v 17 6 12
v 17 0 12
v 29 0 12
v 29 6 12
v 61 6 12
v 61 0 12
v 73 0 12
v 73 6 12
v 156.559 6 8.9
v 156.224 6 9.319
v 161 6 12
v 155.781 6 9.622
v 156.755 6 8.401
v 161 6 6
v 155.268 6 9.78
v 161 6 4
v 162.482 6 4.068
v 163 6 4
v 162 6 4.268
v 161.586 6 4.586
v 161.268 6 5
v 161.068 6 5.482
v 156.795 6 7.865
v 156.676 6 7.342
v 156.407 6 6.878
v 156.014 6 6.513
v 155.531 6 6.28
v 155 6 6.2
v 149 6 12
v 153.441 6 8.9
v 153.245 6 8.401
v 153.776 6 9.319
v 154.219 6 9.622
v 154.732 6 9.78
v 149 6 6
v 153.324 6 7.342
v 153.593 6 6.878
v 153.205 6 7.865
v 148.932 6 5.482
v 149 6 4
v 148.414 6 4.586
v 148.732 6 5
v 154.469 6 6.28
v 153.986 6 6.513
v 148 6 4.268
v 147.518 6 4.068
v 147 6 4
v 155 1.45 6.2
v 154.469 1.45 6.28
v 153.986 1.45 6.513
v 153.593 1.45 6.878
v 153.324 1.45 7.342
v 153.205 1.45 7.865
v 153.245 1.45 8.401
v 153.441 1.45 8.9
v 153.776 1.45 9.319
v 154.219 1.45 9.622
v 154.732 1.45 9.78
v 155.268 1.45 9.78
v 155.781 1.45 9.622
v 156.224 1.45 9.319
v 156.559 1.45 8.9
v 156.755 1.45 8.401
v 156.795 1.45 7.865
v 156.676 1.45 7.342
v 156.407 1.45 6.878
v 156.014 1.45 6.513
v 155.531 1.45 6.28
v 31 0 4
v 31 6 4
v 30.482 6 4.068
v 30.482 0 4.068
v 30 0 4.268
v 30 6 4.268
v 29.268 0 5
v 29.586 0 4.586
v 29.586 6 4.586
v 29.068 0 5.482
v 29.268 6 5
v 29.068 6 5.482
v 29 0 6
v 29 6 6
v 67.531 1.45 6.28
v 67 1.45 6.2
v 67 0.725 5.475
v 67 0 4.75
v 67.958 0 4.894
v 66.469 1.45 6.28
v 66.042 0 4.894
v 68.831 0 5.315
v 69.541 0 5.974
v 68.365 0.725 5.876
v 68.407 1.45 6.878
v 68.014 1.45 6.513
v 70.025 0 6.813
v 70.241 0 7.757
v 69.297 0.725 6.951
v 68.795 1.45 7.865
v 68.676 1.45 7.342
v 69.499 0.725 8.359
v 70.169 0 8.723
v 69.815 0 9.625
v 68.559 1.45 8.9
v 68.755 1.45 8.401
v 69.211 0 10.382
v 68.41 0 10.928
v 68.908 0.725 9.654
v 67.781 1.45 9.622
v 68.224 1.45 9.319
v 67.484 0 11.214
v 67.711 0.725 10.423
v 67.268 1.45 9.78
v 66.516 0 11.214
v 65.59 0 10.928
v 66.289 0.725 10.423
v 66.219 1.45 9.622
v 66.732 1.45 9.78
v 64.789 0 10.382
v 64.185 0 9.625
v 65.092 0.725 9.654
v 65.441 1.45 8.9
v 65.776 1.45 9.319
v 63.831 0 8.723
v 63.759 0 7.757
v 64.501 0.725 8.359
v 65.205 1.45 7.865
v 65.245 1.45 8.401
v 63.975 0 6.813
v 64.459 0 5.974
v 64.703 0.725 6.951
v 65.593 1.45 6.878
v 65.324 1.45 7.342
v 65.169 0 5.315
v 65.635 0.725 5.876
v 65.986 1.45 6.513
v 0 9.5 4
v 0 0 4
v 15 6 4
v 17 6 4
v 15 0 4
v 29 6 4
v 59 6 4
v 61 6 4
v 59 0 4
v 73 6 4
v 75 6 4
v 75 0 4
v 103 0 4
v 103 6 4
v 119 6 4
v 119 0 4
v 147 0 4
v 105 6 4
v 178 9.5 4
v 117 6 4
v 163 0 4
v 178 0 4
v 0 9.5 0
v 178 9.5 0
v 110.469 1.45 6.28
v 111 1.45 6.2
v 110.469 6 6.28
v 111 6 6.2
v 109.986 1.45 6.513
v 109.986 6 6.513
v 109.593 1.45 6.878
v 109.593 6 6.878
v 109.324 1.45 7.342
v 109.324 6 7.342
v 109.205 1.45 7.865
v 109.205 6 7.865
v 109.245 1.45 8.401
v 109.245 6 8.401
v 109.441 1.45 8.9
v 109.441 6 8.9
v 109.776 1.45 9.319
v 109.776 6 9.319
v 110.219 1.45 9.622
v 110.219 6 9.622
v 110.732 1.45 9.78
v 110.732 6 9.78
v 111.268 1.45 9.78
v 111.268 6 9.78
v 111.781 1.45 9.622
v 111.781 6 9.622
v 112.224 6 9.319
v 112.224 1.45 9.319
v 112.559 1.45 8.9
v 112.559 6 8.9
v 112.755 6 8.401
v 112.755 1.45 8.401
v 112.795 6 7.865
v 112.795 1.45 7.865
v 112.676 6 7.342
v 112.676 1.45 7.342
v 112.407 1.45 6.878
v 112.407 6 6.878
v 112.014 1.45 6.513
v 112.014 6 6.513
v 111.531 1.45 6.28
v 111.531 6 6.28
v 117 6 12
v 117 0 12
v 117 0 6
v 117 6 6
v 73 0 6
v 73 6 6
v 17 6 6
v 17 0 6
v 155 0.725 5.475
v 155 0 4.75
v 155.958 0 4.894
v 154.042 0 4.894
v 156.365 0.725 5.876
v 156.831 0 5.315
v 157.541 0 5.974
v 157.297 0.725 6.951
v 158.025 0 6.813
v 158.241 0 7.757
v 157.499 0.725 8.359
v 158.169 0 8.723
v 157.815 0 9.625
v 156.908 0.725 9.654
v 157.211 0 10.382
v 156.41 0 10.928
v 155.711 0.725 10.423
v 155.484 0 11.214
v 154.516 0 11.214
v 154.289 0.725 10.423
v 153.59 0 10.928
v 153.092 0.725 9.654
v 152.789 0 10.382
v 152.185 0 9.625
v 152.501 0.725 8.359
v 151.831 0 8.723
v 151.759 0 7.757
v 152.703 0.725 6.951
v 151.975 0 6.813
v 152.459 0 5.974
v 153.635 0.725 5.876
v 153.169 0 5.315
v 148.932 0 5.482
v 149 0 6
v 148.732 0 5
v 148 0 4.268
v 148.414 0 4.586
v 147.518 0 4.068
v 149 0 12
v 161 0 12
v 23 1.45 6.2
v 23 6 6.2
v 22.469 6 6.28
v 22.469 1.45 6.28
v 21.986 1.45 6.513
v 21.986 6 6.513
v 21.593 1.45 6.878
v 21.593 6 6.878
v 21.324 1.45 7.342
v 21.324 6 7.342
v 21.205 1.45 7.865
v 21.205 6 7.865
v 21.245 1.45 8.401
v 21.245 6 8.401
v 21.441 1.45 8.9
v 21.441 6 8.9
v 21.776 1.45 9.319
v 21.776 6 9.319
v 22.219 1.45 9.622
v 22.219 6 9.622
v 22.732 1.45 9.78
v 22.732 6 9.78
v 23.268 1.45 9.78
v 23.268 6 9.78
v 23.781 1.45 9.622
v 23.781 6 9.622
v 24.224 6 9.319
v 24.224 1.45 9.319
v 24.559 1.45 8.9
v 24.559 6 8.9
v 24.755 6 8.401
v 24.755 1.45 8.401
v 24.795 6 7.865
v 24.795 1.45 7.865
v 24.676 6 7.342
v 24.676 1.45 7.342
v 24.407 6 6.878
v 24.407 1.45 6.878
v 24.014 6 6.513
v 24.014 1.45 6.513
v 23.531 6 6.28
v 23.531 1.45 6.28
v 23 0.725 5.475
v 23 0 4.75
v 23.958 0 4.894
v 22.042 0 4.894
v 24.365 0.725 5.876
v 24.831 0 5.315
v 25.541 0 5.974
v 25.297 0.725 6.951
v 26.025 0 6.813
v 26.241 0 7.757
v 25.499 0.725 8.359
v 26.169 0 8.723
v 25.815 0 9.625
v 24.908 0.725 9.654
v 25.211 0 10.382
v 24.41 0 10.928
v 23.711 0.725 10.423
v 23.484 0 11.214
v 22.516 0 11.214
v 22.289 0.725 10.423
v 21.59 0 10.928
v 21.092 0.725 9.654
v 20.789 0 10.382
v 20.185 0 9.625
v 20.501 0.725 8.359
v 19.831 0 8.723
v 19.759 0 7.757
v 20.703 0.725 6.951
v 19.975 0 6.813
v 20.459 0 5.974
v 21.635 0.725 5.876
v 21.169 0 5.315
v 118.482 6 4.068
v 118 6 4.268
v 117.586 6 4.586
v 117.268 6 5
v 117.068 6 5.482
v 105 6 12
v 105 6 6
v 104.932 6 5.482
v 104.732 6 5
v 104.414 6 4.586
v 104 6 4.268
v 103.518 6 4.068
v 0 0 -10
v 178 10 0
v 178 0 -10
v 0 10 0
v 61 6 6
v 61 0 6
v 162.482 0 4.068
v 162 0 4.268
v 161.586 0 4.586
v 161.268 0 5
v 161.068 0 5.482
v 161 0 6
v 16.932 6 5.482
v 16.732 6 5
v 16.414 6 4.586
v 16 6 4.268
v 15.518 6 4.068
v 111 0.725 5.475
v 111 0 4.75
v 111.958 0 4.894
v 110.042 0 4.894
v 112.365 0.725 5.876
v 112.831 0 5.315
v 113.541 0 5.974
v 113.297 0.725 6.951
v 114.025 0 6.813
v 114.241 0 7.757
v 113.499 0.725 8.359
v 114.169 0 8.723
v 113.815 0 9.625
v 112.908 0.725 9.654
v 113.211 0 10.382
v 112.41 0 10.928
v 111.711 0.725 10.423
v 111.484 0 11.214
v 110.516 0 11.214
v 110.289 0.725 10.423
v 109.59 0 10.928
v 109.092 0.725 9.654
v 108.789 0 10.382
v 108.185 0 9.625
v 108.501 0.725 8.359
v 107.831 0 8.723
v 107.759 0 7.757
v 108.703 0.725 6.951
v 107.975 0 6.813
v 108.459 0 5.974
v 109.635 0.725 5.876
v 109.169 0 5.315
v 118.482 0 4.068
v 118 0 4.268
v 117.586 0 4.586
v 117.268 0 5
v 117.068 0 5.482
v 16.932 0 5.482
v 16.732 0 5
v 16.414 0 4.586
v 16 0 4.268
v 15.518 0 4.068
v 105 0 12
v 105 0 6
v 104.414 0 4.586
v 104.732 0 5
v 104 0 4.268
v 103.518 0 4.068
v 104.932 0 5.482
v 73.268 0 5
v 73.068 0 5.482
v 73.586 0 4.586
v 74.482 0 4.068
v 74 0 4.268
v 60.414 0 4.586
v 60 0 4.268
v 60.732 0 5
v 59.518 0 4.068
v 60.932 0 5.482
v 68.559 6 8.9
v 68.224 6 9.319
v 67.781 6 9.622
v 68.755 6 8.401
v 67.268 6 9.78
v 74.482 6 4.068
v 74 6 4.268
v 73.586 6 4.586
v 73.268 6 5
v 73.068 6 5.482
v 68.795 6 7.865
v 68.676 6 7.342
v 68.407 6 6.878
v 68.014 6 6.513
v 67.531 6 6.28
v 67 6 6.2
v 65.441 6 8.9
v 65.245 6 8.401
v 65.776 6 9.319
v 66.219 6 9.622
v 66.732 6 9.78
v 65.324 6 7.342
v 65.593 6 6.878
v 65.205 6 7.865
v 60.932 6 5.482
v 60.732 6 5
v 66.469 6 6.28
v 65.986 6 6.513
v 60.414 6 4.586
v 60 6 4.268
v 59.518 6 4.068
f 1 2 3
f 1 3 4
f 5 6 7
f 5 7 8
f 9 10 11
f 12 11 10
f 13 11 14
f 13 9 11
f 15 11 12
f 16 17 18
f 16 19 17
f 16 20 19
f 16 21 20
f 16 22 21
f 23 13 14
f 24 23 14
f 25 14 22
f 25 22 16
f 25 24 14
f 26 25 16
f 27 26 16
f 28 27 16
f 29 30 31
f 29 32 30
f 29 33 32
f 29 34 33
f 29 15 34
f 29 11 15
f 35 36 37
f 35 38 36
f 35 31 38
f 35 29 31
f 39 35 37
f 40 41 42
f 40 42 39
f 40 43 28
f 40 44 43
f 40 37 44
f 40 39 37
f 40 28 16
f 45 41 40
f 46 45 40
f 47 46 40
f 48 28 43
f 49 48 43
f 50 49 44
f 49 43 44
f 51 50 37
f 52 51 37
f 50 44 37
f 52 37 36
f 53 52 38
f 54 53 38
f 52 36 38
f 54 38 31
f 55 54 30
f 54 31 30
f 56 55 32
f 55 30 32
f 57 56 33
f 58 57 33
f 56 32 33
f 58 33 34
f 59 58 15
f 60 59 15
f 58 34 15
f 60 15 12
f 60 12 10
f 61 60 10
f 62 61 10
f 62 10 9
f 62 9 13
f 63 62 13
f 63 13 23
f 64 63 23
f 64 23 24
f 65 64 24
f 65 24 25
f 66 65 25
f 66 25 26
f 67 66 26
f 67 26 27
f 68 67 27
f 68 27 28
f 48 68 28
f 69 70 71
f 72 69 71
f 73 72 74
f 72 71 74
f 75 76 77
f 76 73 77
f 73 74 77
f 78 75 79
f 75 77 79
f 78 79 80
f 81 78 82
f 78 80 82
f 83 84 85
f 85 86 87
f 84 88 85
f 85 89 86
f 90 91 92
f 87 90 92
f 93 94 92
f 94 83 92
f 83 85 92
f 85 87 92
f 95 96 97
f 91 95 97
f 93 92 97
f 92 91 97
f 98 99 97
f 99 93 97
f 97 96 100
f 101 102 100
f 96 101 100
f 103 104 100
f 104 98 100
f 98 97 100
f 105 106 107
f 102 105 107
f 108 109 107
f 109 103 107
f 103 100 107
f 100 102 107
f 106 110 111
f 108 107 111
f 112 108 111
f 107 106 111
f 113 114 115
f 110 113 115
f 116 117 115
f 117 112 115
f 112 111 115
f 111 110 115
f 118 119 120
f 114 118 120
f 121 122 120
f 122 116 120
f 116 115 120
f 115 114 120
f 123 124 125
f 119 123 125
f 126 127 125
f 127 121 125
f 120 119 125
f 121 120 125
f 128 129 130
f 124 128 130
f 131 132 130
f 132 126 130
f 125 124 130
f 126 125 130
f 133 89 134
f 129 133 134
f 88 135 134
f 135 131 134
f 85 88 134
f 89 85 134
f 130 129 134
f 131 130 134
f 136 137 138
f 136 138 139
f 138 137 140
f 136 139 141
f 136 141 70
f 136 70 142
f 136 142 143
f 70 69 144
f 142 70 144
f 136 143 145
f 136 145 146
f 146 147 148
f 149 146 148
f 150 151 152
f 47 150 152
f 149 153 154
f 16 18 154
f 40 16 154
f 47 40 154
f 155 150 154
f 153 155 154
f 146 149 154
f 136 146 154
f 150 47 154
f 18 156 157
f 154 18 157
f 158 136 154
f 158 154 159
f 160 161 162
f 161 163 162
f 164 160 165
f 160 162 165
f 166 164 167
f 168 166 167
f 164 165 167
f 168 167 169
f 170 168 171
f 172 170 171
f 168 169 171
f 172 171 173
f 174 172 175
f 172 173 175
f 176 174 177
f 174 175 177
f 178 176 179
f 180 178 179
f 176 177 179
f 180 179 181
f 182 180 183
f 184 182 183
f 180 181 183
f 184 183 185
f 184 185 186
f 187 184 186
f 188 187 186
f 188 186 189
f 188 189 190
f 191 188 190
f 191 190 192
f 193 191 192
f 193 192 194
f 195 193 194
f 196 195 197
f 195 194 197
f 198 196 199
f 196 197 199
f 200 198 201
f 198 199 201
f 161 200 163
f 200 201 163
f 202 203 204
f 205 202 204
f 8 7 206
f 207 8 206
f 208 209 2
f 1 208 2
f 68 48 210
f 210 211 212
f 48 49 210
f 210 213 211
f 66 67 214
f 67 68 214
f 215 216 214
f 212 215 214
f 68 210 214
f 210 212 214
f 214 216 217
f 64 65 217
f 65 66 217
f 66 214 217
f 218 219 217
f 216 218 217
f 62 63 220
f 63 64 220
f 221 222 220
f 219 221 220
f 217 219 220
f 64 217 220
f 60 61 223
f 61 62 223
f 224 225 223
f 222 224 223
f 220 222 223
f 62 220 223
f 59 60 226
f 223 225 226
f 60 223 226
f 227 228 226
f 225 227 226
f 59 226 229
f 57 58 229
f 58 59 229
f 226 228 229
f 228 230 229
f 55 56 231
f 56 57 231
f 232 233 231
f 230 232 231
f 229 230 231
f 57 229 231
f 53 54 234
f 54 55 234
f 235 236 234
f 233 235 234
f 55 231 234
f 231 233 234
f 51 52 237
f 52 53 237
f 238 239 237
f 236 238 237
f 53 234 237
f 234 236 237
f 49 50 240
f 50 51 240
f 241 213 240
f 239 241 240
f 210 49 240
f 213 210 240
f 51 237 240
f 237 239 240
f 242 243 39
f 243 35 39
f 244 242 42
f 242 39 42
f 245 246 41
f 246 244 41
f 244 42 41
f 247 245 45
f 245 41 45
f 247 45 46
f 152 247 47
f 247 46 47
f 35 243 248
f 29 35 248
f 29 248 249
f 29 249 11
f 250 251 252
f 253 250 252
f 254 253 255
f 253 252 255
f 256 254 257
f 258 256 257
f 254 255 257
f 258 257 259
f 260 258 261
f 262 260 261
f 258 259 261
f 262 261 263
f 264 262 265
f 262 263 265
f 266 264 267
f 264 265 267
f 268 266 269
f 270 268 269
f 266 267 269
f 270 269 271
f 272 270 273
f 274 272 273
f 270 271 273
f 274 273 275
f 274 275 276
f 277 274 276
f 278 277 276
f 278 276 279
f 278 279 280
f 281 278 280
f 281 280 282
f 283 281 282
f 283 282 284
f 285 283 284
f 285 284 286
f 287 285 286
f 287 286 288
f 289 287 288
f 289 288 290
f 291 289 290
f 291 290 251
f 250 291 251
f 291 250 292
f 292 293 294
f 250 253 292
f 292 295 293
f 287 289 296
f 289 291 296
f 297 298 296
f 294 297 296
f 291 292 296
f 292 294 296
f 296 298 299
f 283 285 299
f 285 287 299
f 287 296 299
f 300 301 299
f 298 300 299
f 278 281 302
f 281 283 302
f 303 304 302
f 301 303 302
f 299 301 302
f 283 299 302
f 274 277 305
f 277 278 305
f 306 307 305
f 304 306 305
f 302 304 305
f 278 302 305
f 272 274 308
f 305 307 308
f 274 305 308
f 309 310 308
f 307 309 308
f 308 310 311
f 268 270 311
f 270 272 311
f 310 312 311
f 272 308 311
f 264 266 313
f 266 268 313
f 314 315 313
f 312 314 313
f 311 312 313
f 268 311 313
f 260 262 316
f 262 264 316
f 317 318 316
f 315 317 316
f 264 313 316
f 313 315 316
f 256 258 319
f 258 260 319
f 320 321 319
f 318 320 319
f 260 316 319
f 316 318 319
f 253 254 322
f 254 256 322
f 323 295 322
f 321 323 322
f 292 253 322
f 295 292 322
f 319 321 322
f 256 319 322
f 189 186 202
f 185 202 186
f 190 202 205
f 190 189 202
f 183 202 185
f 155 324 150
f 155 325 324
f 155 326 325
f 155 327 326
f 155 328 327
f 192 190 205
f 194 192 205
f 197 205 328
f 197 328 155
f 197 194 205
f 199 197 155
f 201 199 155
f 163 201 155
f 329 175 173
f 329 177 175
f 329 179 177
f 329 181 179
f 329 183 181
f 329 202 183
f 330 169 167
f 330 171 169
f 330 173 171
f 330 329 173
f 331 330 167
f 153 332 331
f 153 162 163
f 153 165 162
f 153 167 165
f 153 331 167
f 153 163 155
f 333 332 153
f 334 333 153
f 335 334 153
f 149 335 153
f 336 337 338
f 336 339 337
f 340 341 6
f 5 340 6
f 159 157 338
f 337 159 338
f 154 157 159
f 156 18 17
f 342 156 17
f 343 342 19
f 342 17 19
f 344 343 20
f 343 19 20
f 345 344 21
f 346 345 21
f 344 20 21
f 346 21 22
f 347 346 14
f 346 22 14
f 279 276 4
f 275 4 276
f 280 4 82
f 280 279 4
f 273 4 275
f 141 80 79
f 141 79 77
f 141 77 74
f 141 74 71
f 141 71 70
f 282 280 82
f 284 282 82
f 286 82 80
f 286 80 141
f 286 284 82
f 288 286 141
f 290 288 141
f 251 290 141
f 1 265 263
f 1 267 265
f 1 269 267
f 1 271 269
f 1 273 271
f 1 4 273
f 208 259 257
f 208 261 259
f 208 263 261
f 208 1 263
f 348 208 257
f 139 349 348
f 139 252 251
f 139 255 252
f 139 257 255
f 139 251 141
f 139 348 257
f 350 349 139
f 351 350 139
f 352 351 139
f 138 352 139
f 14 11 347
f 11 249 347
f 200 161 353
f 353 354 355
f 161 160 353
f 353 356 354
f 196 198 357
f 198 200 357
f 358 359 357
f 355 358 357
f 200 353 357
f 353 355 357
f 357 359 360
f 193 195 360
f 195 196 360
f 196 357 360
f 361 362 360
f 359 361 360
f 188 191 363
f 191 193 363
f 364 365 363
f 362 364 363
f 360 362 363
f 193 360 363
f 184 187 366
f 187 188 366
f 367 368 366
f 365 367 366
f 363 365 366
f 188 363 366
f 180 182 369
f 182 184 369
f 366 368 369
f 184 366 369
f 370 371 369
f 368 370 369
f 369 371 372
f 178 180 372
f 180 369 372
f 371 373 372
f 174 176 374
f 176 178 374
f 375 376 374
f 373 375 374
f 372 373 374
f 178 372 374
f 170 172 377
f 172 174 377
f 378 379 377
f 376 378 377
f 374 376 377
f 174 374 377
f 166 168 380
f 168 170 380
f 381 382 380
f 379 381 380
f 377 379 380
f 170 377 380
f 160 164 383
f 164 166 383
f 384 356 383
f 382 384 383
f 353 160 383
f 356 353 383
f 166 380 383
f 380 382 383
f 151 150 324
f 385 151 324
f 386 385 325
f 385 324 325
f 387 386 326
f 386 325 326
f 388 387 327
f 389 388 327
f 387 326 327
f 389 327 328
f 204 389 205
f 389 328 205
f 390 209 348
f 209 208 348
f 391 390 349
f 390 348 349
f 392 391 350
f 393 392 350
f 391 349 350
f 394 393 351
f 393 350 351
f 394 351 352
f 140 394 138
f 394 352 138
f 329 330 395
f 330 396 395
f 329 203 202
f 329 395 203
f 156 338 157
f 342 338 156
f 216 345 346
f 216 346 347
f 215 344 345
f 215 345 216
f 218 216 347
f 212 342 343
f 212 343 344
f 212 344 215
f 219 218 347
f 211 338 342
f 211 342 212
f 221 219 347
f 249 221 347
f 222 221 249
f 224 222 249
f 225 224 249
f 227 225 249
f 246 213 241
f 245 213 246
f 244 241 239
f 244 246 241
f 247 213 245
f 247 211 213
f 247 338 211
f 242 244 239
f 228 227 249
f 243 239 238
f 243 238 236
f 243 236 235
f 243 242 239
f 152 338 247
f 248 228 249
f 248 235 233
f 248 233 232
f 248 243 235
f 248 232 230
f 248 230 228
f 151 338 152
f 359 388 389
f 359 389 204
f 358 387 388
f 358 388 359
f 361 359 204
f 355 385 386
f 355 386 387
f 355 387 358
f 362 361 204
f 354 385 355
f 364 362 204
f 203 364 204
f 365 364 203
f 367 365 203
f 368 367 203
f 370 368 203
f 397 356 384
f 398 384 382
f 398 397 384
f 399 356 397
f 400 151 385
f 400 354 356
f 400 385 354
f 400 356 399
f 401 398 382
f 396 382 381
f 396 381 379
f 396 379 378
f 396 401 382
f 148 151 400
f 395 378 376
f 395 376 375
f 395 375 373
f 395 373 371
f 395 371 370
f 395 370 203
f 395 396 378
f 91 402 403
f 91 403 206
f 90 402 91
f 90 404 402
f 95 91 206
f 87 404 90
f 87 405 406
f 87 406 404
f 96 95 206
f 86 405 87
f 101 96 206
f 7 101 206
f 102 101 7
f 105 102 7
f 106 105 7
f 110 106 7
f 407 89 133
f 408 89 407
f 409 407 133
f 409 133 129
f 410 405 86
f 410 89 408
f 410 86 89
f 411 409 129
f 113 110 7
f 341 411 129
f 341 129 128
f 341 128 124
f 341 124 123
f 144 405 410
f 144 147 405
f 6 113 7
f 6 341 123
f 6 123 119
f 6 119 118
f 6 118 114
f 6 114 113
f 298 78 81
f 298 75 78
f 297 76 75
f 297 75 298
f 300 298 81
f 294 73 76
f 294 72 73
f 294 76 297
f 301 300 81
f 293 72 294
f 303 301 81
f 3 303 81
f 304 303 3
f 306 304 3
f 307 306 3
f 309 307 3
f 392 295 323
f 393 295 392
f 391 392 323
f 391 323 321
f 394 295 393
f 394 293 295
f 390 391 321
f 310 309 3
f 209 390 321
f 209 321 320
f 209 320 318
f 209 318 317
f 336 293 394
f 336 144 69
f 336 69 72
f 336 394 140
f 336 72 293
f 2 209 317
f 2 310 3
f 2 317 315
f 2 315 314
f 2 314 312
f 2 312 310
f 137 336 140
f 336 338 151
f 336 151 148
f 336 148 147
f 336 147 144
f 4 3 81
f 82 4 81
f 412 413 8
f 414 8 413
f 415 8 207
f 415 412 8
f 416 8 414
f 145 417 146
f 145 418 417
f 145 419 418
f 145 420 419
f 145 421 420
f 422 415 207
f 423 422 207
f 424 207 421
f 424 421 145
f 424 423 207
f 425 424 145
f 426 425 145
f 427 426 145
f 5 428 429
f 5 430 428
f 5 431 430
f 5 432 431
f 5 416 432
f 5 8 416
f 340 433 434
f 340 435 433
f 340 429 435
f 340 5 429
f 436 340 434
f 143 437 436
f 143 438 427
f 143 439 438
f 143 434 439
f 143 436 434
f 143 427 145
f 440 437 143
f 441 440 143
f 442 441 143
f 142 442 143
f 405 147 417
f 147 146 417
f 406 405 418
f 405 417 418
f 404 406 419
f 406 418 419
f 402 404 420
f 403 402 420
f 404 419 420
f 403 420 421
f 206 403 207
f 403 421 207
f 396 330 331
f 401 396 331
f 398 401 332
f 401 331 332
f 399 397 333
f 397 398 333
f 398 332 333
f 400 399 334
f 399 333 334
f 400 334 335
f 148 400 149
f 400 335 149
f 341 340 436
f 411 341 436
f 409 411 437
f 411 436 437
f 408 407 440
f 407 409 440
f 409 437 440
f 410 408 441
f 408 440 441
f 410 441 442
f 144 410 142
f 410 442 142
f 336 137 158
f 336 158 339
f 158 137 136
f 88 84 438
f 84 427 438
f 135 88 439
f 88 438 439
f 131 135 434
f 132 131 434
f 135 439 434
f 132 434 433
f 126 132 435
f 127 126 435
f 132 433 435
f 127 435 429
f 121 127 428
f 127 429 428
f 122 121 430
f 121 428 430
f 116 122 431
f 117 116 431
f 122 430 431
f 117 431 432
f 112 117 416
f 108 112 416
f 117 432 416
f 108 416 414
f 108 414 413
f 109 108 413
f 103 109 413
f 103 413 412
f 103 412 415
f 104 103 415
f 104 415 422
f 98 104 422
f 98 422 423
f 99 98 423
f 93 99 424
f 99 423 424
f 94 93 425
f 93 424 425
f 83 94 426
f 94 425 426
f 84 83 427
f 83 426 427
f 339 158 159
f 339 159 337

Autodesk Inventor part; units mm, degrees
ref_plane "YZ Plane" through (0, 0, 0) normal (1, 0, 0) x (0, 1, 0)
ref_plane "XZ Plane" through (0, 0, 0) normal (0, 1, 0) x (-1, 0, 0)
ref_plane "XY Plane" through (0, 0, 0) normal (0, 0, 1) x (1, 0, 0)
sketch "Sketch3" plane through (0, 0, 0) normal (1, 0, 0) x (0, 1, 0)
  line L0 (0, 0) -> (10, 0)
  line L1 (10, 0) -> (10, -10)
  line L2 (10, -10) -> (0, -10)
  line L3 (0, -10) -> (0, 0)
  line L4 (10, 0) -> (0, -10)
  line L5 (6, 0) -> (0, 0)
  line L6 (0, 0) -> (0, 12)
  line L7 (0, 12) -> (6, 12)
  line L8 (6, 12) -> (6, 0)
  line L9 (9.5, 0) -> (6, 0)
  line L10 (6, 0) -> (6, 4)
  line L11 (6, 4) -> (9.5, 4)
  line L12 (9.5, 4) -> (9.5, 0)
  dimension "d30" = 12
  dimension "d31" = 6
  dimension "d63" = 10
  dimension "d74" = 0.5
  dimension "d75" = 4
  dimension "d76" = 3.5
  dimension "d141" = 45
  dimension "d142" = 10
extrude "Extrusion2" add sketch "Sketch3" along normal blind 178 contours L6 L7 L8 L0 | L0 L4 L3 | L8 L11 L12 L0
sketch "Sketch10" plane through (0, 0, -10) normal (0, -1, 0) x (1, 0, 0)
  line L0 (0, 14) -> (0, 22) projected
  line L1 (0, 22) -> (178, 22) projected
  line L2 (178, 14) -> (178, 22) projected
  line L3 (0, 14) -> (178, 14) projected
  line L4 (0, 10) -> (0, 14) projected
  line L5 (0, 14) -> (17, 14)
  line L6 (17, 14) -> (17, 22)
  line L7 (17, 22) -> (0, 22)
  line L8 (0, 22) -> (0, 14)
  line L9 (0, 14) -> (178, 14) projected
  line L10 (178, 22) -> (161, 22)
  line L11 (161, 22) -> (161, 14)
  line L12 (161, 14) -> (178, 14)
  line L13 (178, 14) -> (178, 22)
  line L14 (17, 22) -> (29, 22)
  line L15 (29, 22) -> (29, 14)
  line L16 (29, 14) -> (17, 14)
  line L17 (17, 14) -> (17, 22)
  line L18 (61, 22) -> (73, 22)
  line L19 (73, 22) -> (73, 14)
  line L20 (73, 14) -> (61, 14)
  line L21 (61, 14) -> (61, 22)
  line L22 (105, 22) -> (117, 22)
  line L23 (117, 22) -> (117, 14)
  line L24 (117, 14) -> (105, 14)
  line L25 (105, 14) -> (105, 22)
  line L26 (149, 22) -> (161, 22)
  line L27 (161, 22) -> (161, 14)
  line L28 (161, 14) -> (149, 14)
  line L29 (149, 14) -> (149, 22)
  line L30 (17, 22) -> (29, 14)
  line L31 (29, 22) -> (17, 14)
  line L32 (61, 22) -> (73, 14)
  line L33 (73, 22) -> (61, 14)
  line L34 (105, 22) -> (117, 14)
  line L35 (117, 22) -> (105, 14)
  line L36 (149, 22) -> (161, 14)
  line L37 (161, 22) -> (149, 14)
  point P0 (105, 14)
  point P1 (23, 18)
  point P2 (67, 18)
  point P3 (111, 18)
  point P4 (155, 18)
  dimension "d118" = 17
  dimension "d119" = 17
  dimension "d120" = 12
  dimension "d121" = 12
  dimension "d122" = 12
  dimension "d123" = 12
  dimension "d124" = 0
  dimension "d125" = 0
  dimension "d126" = 32
  dimension "d129" = 32
  dimension "d130" = 32
extrude "Extrusion5" cut sketch "Sketch10" against normal up to next contours L0 L1 L6 L3 | L15 L1 L21 L3 | L19 L1 L25 L3 | L23 L1 L29 L3 | L11 L1 L2 L3
hole "Hole4" at (23, 0, 8) at (67, 0, 8) at (111, 0, 8) at (155, 0, 8) direction (0, 1, 0) diameter 3.6 end through all countersink diameter 6.5 countersink angle 90 clearance for "Countersunk Flat Head Screw ISO 2009/7046" size "M3" standard "ISO"
fillet "Fillet2" radius 2 8 edges at (17, 3, 4) (29, 3, 4) (61, 3, 4) (73, 3, 4) (105, 3, 4) (117, 3, 4) (149, 3, 4) (161, 3, 4)
equation "\"d126\" = d130"
equation "\"d129\" = d130"
properties part number "plog" material "Steel, Alloy"
